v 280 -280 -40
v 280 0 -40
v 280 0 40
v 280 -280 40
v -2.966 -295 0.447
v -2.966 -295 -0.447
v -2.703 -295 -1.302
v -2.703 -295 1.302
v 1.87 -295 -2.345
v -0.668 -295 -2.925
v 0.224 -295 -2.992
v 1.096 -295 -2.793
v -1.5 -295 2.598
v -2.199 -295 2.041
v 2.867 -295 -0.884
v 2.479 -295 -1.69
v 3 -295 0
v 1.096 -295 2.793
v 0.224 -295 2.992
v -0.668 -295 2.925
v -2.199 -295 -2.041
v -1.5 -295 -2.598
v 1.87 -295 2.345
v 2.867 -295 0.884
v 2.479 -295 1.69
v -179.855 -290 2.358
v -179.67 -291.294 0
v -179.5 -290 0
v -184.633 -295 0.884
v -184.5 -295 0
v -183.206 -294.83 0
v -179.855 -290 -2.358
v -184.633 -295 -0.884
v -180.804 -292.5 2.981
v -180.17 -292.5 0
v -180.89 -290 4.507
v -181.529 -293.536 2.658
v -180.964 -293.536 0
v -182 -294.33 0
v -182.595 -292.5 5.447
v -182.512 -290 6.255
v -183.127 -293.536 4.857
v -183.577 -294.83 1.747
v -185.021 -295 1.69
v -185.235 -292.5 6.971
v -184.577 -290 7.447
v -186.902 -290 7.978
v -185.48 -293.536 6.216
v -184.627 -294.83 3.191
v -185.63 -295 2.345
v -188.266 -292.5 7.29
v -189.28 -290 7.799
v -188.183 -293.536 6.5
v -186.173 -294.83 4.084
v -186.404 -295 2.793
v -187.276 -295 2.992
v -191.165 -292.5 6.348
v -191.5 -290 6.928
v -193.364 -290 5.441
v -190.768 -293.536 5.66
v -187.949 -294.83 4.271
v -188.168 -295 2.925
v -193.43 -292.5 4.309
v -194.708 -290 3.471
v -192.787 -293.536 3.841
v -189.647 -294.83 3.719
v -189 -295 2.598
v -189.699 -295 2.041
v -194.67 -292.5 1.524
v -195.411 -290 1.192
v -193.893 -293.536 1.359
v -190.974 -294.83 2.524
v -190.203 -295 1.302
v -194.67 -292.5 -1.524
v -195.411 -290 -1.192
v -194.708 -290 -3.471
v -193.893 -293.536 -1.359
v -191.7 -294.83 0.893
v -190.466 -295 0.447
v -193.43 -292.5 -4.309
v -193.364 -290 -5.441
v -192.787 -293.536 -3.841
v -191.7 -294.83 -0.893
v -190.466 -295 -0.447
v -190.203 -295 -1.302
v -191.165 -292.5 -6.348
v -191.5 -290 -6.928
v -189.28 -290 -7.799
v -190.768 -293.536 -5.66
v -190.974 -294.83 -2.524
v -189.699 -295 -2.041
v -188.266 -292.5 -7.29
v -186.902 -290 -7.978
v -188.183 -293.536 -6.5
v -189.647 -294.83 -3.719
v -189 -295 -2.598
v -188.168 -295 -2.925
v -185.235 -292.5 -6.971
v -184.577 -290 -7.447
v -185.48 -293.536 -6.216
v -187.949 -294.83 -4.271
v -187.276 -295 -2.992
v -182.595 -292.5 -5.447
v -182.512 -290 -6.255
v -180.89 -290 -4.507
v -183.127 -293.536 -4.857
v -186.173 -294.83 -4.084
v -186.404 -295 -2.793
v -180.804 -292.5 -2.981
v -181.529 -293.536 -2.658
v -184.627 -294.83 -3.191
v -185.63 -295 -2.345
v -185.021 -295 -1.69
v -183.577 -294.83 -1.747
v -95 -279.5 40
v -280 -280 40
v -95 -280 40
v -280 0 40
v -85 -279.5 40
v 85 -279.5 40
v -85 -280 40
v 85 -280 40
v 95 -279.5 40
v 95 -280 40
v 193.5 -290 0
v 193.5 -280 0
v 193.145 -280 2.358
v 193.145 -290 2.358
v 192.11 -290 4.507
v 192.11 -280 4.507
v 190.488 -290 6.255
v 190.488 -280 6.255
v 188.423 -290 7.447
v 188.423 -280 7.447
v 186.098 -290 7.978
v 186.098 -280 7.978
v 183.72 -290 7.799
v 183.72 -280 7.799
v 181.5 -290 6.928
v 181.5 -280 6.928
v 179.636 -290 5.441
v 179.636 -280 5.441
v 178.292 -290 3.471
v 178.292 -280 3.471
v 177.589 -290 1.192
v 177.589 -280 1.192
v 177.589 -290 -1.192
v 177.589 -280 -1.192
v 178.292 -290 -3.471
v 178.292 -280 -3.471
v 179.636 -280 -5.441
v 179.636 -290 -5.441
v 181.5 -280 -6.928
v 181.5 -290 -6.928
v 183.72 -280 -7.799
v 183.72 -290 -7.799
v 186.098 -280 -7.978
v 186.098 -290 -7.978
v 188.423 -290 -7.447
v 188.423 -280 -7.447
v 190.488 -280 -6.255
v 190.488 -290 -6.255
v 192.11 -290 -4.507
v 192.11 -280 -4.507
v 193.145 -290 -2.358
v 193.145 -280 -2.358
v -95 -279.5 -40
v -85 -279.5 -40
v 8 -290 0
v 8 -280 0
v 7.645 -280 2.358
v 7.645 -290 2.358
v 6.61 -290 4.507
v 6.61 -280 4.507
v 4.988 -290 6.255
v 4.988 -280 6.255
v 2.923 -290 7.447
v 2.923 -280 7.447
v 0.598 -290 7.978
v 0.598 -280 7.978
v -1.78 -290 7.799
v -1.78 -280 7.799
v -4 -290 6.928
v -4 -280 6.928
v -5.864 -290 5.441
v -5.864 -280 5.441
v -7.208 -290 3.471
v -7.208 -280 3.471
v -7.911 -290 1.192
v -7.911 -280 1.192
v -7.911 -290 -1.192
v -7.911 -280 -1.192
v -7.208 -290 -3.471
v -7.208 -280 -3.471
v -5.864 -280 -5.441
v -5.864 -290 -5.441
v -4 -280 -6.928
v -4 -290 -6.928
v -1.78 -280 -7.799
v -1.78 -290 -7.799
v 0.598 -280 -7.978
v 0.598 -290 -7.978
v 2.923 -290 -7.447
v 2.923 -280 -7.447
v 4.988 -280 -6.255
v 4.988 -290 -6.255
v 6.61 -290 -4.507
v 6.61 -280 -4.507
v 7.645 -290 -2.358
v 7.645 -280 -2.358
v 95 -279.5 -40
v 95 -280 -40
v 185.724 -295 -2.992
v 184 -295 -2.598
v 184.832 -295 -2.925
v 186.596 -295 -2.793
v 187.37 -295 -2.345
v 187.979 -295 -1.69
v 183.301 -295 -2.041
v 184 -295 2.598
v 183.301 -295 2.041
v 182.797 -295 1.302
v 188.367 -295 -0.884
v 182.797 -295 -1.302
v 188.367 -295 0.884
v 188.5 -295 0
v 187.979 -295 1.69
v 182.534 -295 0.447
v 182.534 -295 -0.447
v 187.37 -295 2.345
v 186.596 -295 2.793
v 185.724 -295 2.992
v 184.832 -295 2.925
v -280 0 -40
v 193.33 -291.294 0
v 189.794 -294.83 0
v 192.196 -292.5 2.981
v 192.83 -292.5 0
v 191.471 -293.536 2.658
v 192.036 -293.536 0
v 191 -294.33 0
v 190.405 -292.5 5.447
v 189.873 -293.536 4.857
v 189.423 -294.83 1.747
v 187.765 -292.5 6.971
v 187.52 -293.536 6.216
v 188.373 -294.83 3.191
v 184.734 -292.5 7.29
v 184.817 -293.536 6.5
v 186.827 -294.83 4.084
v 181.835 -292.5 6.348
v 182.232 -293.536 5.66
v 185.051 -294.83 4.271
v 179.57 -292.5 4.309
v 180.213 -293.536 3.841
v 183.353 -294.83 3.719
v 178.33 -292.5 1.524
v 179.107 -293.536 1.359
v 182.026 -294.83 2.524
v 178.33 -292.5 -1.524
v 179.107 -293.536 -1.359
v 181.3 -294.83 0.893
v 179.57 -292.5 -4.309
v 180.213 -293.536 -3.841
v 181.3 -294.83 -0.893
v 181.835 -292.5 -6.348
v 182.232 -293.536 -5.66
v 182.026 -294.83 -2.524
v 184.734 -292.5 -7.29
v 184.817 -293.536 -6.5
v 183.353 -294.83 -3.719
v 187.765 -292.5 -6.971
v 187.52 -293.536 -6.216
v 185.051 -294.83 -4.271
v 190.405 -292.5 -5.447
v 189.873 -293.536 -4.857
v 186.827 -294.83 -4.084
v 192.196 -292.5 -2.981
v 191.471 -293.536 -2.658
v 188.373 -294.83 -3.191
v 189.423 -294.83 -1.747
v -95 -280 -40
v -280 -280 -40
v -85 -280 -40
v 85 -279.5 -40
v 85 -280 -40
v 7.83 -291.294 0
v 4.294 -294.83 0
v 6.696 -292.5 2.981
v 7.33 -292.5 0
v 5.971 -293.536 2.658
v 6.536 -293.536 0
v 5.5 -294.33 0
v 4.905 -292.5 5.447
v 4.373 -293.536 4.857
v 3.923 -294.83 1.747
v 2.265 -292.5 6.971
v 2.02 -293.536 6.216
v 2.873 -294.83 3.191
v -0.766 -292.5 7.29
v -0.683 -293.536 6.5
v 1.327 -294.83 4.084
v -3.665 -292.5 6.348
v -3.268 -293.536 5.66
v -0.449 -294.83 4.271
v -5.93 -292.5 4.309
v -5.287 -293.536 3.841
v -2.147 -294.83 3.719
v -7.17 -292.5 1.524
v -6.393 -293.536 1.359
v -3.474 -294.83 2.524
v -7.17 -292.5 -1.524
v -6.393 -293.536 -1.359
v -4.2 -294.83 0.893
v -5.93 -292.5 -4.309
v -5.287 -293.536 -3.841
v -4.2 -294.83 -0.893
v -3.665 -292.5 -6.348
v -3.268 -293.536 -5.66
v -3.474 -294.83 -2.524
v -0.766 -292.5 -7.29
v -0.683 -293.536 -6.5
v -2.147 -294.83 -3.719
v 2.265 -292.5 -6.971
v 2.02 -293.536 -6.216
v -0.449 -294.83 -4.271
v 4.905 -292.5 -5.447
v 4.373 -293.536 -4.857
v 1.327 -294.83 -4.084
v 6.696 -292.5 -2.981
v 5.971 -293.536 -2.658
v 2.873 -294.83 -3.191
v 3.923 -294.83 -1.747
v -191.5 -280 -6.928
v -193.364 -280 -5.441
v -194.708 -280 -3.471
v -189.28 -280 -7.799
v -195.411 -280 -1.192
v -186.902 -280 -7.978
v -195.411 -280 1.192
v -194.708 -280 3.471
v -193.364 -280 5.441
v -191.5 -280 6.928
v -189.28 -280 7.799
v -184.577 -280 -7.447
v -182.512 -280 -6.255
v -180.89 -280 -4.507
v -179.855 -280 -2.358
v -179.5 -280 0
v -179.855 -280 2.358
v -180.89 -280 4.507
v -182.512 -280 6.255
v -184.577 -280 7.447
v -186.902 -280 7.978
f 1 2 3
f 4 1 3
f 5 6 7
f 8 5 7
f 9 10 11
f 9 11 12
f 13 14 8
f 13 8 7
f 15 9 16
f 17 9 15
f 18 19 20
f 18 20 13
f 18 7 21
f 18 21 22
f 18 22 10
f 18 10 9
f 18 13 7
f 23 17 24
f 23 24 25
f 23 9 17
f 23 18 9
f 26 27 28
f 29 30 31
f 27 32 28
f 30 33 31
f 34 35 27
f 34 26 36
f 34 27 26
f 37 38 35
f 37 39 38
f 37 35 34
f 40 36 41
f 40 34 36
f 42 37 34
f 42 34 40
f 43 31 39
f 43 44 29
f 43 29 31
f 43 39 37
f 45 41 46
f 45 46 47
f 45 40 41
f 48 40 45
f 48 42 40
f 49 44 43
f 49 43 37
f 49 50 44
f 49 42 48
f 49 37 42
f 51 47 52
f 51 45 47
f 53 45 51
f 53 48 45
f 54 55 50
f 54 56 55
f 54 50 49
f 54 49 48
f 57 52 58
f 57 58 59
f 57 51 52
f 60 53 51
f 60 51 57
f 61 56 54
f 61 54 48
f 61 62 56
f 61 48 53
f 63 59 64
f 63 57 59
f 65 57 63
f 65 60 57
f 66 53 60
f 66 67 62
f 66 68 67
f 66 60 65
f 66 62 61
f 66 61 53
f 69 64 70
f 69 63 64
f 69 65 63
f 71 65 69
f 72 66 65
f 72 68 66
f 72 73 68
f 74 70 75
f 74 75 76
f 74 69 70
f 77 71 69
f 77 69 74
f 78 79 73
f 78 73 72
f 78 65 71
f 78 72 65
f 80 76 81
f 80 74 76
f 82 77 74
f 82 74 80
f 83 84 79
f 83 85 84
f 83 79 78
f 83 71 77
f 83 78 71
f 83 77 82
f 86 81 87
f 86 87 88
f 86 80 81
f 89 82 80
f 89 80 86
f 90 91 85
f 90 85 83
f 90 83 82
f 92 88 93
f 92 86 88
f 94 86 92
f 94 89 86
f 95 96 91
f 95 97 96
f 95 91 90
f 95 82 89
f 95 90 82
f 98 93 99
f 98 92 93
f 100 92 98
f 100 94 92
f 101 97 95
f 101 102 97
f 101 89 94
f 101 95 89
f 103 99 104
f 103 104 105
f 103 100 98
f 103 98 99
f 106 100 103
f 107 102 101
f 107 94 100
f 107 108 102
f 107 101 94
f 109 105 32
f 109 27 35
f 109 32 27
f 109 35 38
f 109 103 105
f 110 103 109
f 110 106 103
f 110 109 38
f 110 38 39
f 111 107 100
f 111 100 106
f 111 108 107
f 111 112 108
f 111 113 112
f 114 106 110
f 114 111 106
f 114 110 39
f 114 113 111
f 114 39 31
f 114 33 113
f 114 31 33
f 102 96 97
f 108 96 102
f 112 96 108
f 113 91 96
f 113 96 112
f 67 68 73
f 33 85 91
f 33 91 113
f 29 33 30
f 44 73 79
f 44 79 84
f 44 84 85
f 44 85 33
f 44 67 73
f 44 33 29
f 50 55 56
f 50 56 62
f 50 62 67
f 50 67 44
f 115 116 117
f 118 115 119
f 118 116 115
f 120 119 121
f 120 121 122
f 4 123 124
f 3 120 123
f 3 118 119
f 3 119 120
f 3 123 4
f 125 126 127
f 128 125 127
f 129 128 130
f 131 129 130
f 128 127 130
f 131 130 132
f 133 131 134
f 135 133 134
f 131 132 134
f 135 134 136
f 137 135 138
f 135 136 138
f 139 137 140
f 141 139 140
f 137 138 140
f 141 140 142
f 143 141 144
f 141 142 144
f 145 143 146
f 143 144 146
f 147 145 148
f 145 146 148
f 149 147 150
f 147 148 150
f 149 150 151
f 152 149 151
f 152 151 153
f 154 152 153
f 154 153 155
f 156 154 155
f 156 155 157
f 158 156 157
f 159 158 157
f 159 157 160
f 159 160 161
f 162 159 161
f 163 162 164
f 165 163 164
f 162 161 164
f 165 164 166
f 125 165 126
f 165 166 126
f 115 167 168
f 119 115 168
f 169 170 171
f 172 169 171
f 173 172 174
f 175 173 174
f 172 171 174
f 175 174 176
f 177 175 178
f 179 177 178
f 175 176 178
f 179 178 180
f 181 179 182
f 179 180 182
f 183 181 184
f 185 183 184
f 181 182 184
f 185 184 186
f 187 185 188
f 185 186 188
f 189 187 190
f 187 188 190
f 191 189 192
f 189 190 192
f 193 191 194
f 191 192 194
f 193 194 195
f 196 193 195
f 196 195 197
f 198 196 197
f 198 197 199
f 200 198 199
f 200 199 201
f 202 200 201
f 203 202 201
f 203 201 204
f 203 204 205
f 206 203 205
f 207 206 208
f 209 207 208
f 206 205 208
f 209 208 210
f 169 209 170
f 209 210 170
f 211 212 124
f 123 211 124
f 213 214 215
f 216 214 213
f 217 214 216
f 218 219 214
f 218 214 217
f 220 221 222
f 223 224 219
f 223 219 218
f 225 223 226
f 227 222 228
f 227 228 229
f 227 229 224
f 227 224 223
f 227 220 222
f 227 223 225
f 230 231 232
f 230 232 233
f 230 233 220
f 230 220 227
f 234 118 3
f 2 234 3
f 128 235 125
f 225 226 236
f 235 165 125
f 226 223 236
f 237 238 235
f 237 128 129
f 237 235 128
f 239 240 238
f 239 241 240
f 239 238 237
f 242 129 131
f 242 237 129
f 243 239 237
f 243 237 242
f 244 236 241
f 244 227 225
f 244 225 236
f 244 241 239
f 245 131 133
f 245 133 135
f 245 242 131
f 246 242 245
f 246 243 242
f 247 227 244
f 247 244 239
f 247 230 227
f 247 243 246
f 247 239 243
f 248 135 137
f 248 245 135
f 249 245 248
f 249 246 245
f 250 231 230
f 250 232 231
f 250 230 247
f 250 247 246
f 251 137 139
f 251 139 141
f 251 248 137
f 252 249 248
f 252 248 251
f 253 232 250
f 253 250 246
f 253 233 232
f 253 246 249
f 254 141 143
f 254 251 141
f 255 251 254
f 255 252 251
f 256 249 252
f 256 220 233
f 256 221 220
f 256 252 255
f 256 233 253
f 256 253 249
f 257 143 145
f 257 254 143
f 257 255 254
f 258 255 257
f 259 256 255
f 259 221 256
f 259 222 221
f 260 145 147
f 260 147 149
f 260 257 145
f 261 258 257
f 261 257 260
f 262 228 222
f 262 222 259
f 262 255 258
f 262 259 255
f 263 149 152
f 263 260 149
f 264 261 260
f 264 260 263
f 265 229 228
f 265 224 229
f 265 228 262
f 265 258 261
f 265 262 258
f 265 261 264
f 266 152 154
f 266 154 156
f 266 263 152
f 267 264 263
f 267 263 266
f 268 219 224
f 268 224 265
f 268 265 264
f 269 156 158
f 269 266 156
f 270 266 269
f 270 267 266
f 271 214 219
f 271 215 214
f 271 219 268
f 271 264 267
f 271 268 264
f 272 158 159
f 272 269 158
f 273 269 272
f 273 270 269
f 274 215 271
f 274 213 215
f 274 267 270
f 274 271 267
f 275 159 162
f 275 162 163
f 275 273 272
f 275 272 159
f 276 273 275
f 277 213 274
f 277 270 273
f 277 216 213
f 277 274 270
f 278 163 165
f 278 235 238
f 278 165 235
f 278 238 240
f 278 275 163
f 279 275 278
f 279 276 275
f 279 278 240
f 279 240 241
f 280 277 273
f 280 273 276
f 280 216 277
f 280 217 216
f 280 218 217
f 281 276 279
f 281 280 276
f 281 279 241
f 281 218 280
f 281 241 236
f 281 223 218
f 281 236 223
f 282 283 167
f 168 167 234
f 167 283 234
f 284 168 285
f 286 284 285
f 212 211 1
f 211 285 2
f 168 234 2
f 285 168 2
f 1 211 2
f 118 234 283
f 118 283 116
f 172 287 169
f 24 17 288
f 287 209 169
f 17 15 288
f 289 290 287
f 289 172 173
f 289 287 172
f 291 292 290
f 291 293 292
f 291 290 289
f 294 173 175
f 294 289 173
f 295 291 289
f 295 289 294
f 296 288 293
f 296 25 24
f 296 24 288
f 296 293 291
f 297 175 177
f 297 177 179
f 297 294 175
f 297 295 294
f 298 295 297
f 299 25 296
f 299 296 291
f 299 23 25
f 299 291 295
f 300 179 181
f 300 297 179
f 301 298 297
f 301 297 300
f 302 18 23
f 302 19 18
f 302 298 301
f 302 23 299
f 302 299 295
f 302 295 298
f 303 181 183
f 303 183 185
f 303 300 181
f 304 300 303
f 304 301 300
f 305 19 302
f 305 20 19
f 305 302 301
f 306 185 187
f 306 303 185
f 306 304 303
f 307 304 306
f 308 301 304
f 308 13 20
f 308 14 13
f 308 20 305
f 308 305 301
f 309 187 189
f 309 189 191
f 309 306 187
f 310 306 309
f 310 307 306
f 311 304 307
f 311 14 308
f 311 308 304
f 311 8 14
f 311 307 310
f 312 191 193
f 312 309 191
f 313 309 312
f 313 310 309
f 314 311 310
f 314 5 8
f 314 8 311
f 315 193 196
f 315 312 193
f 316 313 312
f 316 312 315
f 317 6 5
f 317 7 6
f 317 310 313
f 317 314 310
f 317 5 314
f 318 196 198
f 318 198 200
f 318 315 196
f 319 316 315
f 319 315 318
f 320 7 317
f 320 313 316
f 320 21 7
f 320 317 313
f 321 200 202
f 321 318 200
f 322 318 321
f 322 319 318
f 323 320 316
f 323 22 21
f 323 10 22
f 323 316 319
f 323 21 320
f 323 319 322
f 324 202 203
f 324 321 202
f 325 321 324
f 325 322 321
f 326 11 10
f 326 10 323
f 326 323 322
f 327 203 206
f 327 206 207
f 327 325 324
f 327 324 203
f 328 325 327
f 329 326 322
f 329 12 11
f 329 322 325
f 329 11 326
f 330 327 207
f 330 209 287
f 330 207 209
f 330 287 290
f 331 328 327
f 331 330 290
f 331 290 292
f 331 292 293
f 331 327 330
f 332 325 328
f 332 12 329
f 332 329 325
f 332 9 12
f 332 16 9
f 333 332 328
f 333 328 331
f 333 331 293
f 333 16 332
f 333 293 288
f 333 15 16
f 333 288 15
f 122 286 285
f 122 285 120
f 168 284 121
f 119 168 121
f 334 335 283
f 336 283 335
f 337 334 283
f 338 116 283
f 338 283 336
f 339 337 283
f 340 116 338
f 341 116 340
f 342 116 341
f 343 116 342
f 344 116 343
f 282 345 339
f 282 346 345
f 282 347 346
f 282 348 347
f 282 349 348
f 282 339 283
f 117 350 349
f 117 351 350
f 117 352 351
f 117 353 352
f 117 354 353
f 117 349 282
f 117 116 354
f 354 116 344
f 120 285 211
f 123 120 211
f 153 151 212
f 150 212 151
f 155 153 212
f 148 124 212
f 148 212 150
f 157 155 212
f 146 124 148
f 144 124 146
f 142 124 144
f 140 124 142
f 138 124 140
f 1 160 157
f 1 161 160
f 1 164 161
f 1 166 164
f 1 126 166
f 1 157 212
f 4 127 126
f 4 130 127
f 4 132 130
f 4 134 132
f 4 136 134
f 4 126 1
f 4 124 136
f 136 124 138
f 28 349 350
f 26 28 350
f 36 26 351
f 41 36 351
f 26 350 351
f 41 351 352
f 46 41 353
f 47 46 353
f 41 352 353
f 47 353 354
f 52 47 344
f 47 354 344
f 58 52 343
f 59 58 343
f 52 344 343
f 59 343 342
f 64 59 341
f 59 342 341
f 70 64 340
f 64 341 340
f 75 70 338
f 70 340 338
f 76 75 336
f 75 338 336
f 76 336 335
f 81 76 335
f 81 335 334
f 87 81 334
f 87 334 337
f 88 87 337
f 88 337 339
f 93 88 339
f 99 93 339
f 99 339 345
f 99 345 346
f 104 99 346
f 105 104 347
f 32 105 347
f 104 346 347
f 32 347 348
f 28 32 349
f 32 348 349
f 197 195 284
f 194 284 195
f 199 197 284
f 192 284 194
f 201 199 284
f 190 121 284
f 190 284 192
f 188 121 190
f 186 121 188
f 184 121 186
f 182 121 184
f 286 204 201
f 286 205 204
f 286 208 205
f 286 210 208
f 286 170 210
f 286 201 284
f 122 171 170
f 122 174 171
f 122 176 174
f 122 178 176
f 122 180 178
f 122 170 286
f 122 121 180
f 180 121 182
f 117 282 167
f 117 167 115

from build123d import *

# Parameters (mm, degrees)
F0_W     = 560
F0_H     = 80
F1_DEPTH = 280
F2_W     = 10
F2_H     = 80
F3_DEPTH = 0.5
F4_R     = 8
F5_DEPTH = 15
F6_R     = 5


with BuildPart() as f1:
    # F0 (on Front) → F1 (new body)
    with BuildSketch(Plane.XZ):
        Rectangle(F0_W, F0_H)
    extrude(amount=F1_DEPTH)

    # F2 (on face) → F3 (cut)
    with BuildSketch(Plane.XZ.offset(280)):
        with Locations((-90, 0)):
            Rectangle(F2_W, F2_H)
        with Locations((90, 0)):
            Rectangle(F2_W, F2_H)
    extrude(amount=-F3_DEPTH, mode=Mode.SUBTRACT)

    # F4 (on face) → F5 (join)
    with BuildSketch(Plane.XZ.offset(280)):
        with Locations((-187.5, 0)):
            Circle(F4_R)
        Circle(F4_R)
        with Locations((185.5, 0)):
            Circle(F4_R)
    extrude(amount=F5_DEPTH)

    # F6
    f6_edges = [f1.edges().sort_by_distance(p)[0] for p in [
        (-195.5, -295, 0),
        (-8, -295, 0),
        (177.5, -295, 0),
    ]]
    fillet(f6_edges, radius=F6_R)


solid = f1.part
